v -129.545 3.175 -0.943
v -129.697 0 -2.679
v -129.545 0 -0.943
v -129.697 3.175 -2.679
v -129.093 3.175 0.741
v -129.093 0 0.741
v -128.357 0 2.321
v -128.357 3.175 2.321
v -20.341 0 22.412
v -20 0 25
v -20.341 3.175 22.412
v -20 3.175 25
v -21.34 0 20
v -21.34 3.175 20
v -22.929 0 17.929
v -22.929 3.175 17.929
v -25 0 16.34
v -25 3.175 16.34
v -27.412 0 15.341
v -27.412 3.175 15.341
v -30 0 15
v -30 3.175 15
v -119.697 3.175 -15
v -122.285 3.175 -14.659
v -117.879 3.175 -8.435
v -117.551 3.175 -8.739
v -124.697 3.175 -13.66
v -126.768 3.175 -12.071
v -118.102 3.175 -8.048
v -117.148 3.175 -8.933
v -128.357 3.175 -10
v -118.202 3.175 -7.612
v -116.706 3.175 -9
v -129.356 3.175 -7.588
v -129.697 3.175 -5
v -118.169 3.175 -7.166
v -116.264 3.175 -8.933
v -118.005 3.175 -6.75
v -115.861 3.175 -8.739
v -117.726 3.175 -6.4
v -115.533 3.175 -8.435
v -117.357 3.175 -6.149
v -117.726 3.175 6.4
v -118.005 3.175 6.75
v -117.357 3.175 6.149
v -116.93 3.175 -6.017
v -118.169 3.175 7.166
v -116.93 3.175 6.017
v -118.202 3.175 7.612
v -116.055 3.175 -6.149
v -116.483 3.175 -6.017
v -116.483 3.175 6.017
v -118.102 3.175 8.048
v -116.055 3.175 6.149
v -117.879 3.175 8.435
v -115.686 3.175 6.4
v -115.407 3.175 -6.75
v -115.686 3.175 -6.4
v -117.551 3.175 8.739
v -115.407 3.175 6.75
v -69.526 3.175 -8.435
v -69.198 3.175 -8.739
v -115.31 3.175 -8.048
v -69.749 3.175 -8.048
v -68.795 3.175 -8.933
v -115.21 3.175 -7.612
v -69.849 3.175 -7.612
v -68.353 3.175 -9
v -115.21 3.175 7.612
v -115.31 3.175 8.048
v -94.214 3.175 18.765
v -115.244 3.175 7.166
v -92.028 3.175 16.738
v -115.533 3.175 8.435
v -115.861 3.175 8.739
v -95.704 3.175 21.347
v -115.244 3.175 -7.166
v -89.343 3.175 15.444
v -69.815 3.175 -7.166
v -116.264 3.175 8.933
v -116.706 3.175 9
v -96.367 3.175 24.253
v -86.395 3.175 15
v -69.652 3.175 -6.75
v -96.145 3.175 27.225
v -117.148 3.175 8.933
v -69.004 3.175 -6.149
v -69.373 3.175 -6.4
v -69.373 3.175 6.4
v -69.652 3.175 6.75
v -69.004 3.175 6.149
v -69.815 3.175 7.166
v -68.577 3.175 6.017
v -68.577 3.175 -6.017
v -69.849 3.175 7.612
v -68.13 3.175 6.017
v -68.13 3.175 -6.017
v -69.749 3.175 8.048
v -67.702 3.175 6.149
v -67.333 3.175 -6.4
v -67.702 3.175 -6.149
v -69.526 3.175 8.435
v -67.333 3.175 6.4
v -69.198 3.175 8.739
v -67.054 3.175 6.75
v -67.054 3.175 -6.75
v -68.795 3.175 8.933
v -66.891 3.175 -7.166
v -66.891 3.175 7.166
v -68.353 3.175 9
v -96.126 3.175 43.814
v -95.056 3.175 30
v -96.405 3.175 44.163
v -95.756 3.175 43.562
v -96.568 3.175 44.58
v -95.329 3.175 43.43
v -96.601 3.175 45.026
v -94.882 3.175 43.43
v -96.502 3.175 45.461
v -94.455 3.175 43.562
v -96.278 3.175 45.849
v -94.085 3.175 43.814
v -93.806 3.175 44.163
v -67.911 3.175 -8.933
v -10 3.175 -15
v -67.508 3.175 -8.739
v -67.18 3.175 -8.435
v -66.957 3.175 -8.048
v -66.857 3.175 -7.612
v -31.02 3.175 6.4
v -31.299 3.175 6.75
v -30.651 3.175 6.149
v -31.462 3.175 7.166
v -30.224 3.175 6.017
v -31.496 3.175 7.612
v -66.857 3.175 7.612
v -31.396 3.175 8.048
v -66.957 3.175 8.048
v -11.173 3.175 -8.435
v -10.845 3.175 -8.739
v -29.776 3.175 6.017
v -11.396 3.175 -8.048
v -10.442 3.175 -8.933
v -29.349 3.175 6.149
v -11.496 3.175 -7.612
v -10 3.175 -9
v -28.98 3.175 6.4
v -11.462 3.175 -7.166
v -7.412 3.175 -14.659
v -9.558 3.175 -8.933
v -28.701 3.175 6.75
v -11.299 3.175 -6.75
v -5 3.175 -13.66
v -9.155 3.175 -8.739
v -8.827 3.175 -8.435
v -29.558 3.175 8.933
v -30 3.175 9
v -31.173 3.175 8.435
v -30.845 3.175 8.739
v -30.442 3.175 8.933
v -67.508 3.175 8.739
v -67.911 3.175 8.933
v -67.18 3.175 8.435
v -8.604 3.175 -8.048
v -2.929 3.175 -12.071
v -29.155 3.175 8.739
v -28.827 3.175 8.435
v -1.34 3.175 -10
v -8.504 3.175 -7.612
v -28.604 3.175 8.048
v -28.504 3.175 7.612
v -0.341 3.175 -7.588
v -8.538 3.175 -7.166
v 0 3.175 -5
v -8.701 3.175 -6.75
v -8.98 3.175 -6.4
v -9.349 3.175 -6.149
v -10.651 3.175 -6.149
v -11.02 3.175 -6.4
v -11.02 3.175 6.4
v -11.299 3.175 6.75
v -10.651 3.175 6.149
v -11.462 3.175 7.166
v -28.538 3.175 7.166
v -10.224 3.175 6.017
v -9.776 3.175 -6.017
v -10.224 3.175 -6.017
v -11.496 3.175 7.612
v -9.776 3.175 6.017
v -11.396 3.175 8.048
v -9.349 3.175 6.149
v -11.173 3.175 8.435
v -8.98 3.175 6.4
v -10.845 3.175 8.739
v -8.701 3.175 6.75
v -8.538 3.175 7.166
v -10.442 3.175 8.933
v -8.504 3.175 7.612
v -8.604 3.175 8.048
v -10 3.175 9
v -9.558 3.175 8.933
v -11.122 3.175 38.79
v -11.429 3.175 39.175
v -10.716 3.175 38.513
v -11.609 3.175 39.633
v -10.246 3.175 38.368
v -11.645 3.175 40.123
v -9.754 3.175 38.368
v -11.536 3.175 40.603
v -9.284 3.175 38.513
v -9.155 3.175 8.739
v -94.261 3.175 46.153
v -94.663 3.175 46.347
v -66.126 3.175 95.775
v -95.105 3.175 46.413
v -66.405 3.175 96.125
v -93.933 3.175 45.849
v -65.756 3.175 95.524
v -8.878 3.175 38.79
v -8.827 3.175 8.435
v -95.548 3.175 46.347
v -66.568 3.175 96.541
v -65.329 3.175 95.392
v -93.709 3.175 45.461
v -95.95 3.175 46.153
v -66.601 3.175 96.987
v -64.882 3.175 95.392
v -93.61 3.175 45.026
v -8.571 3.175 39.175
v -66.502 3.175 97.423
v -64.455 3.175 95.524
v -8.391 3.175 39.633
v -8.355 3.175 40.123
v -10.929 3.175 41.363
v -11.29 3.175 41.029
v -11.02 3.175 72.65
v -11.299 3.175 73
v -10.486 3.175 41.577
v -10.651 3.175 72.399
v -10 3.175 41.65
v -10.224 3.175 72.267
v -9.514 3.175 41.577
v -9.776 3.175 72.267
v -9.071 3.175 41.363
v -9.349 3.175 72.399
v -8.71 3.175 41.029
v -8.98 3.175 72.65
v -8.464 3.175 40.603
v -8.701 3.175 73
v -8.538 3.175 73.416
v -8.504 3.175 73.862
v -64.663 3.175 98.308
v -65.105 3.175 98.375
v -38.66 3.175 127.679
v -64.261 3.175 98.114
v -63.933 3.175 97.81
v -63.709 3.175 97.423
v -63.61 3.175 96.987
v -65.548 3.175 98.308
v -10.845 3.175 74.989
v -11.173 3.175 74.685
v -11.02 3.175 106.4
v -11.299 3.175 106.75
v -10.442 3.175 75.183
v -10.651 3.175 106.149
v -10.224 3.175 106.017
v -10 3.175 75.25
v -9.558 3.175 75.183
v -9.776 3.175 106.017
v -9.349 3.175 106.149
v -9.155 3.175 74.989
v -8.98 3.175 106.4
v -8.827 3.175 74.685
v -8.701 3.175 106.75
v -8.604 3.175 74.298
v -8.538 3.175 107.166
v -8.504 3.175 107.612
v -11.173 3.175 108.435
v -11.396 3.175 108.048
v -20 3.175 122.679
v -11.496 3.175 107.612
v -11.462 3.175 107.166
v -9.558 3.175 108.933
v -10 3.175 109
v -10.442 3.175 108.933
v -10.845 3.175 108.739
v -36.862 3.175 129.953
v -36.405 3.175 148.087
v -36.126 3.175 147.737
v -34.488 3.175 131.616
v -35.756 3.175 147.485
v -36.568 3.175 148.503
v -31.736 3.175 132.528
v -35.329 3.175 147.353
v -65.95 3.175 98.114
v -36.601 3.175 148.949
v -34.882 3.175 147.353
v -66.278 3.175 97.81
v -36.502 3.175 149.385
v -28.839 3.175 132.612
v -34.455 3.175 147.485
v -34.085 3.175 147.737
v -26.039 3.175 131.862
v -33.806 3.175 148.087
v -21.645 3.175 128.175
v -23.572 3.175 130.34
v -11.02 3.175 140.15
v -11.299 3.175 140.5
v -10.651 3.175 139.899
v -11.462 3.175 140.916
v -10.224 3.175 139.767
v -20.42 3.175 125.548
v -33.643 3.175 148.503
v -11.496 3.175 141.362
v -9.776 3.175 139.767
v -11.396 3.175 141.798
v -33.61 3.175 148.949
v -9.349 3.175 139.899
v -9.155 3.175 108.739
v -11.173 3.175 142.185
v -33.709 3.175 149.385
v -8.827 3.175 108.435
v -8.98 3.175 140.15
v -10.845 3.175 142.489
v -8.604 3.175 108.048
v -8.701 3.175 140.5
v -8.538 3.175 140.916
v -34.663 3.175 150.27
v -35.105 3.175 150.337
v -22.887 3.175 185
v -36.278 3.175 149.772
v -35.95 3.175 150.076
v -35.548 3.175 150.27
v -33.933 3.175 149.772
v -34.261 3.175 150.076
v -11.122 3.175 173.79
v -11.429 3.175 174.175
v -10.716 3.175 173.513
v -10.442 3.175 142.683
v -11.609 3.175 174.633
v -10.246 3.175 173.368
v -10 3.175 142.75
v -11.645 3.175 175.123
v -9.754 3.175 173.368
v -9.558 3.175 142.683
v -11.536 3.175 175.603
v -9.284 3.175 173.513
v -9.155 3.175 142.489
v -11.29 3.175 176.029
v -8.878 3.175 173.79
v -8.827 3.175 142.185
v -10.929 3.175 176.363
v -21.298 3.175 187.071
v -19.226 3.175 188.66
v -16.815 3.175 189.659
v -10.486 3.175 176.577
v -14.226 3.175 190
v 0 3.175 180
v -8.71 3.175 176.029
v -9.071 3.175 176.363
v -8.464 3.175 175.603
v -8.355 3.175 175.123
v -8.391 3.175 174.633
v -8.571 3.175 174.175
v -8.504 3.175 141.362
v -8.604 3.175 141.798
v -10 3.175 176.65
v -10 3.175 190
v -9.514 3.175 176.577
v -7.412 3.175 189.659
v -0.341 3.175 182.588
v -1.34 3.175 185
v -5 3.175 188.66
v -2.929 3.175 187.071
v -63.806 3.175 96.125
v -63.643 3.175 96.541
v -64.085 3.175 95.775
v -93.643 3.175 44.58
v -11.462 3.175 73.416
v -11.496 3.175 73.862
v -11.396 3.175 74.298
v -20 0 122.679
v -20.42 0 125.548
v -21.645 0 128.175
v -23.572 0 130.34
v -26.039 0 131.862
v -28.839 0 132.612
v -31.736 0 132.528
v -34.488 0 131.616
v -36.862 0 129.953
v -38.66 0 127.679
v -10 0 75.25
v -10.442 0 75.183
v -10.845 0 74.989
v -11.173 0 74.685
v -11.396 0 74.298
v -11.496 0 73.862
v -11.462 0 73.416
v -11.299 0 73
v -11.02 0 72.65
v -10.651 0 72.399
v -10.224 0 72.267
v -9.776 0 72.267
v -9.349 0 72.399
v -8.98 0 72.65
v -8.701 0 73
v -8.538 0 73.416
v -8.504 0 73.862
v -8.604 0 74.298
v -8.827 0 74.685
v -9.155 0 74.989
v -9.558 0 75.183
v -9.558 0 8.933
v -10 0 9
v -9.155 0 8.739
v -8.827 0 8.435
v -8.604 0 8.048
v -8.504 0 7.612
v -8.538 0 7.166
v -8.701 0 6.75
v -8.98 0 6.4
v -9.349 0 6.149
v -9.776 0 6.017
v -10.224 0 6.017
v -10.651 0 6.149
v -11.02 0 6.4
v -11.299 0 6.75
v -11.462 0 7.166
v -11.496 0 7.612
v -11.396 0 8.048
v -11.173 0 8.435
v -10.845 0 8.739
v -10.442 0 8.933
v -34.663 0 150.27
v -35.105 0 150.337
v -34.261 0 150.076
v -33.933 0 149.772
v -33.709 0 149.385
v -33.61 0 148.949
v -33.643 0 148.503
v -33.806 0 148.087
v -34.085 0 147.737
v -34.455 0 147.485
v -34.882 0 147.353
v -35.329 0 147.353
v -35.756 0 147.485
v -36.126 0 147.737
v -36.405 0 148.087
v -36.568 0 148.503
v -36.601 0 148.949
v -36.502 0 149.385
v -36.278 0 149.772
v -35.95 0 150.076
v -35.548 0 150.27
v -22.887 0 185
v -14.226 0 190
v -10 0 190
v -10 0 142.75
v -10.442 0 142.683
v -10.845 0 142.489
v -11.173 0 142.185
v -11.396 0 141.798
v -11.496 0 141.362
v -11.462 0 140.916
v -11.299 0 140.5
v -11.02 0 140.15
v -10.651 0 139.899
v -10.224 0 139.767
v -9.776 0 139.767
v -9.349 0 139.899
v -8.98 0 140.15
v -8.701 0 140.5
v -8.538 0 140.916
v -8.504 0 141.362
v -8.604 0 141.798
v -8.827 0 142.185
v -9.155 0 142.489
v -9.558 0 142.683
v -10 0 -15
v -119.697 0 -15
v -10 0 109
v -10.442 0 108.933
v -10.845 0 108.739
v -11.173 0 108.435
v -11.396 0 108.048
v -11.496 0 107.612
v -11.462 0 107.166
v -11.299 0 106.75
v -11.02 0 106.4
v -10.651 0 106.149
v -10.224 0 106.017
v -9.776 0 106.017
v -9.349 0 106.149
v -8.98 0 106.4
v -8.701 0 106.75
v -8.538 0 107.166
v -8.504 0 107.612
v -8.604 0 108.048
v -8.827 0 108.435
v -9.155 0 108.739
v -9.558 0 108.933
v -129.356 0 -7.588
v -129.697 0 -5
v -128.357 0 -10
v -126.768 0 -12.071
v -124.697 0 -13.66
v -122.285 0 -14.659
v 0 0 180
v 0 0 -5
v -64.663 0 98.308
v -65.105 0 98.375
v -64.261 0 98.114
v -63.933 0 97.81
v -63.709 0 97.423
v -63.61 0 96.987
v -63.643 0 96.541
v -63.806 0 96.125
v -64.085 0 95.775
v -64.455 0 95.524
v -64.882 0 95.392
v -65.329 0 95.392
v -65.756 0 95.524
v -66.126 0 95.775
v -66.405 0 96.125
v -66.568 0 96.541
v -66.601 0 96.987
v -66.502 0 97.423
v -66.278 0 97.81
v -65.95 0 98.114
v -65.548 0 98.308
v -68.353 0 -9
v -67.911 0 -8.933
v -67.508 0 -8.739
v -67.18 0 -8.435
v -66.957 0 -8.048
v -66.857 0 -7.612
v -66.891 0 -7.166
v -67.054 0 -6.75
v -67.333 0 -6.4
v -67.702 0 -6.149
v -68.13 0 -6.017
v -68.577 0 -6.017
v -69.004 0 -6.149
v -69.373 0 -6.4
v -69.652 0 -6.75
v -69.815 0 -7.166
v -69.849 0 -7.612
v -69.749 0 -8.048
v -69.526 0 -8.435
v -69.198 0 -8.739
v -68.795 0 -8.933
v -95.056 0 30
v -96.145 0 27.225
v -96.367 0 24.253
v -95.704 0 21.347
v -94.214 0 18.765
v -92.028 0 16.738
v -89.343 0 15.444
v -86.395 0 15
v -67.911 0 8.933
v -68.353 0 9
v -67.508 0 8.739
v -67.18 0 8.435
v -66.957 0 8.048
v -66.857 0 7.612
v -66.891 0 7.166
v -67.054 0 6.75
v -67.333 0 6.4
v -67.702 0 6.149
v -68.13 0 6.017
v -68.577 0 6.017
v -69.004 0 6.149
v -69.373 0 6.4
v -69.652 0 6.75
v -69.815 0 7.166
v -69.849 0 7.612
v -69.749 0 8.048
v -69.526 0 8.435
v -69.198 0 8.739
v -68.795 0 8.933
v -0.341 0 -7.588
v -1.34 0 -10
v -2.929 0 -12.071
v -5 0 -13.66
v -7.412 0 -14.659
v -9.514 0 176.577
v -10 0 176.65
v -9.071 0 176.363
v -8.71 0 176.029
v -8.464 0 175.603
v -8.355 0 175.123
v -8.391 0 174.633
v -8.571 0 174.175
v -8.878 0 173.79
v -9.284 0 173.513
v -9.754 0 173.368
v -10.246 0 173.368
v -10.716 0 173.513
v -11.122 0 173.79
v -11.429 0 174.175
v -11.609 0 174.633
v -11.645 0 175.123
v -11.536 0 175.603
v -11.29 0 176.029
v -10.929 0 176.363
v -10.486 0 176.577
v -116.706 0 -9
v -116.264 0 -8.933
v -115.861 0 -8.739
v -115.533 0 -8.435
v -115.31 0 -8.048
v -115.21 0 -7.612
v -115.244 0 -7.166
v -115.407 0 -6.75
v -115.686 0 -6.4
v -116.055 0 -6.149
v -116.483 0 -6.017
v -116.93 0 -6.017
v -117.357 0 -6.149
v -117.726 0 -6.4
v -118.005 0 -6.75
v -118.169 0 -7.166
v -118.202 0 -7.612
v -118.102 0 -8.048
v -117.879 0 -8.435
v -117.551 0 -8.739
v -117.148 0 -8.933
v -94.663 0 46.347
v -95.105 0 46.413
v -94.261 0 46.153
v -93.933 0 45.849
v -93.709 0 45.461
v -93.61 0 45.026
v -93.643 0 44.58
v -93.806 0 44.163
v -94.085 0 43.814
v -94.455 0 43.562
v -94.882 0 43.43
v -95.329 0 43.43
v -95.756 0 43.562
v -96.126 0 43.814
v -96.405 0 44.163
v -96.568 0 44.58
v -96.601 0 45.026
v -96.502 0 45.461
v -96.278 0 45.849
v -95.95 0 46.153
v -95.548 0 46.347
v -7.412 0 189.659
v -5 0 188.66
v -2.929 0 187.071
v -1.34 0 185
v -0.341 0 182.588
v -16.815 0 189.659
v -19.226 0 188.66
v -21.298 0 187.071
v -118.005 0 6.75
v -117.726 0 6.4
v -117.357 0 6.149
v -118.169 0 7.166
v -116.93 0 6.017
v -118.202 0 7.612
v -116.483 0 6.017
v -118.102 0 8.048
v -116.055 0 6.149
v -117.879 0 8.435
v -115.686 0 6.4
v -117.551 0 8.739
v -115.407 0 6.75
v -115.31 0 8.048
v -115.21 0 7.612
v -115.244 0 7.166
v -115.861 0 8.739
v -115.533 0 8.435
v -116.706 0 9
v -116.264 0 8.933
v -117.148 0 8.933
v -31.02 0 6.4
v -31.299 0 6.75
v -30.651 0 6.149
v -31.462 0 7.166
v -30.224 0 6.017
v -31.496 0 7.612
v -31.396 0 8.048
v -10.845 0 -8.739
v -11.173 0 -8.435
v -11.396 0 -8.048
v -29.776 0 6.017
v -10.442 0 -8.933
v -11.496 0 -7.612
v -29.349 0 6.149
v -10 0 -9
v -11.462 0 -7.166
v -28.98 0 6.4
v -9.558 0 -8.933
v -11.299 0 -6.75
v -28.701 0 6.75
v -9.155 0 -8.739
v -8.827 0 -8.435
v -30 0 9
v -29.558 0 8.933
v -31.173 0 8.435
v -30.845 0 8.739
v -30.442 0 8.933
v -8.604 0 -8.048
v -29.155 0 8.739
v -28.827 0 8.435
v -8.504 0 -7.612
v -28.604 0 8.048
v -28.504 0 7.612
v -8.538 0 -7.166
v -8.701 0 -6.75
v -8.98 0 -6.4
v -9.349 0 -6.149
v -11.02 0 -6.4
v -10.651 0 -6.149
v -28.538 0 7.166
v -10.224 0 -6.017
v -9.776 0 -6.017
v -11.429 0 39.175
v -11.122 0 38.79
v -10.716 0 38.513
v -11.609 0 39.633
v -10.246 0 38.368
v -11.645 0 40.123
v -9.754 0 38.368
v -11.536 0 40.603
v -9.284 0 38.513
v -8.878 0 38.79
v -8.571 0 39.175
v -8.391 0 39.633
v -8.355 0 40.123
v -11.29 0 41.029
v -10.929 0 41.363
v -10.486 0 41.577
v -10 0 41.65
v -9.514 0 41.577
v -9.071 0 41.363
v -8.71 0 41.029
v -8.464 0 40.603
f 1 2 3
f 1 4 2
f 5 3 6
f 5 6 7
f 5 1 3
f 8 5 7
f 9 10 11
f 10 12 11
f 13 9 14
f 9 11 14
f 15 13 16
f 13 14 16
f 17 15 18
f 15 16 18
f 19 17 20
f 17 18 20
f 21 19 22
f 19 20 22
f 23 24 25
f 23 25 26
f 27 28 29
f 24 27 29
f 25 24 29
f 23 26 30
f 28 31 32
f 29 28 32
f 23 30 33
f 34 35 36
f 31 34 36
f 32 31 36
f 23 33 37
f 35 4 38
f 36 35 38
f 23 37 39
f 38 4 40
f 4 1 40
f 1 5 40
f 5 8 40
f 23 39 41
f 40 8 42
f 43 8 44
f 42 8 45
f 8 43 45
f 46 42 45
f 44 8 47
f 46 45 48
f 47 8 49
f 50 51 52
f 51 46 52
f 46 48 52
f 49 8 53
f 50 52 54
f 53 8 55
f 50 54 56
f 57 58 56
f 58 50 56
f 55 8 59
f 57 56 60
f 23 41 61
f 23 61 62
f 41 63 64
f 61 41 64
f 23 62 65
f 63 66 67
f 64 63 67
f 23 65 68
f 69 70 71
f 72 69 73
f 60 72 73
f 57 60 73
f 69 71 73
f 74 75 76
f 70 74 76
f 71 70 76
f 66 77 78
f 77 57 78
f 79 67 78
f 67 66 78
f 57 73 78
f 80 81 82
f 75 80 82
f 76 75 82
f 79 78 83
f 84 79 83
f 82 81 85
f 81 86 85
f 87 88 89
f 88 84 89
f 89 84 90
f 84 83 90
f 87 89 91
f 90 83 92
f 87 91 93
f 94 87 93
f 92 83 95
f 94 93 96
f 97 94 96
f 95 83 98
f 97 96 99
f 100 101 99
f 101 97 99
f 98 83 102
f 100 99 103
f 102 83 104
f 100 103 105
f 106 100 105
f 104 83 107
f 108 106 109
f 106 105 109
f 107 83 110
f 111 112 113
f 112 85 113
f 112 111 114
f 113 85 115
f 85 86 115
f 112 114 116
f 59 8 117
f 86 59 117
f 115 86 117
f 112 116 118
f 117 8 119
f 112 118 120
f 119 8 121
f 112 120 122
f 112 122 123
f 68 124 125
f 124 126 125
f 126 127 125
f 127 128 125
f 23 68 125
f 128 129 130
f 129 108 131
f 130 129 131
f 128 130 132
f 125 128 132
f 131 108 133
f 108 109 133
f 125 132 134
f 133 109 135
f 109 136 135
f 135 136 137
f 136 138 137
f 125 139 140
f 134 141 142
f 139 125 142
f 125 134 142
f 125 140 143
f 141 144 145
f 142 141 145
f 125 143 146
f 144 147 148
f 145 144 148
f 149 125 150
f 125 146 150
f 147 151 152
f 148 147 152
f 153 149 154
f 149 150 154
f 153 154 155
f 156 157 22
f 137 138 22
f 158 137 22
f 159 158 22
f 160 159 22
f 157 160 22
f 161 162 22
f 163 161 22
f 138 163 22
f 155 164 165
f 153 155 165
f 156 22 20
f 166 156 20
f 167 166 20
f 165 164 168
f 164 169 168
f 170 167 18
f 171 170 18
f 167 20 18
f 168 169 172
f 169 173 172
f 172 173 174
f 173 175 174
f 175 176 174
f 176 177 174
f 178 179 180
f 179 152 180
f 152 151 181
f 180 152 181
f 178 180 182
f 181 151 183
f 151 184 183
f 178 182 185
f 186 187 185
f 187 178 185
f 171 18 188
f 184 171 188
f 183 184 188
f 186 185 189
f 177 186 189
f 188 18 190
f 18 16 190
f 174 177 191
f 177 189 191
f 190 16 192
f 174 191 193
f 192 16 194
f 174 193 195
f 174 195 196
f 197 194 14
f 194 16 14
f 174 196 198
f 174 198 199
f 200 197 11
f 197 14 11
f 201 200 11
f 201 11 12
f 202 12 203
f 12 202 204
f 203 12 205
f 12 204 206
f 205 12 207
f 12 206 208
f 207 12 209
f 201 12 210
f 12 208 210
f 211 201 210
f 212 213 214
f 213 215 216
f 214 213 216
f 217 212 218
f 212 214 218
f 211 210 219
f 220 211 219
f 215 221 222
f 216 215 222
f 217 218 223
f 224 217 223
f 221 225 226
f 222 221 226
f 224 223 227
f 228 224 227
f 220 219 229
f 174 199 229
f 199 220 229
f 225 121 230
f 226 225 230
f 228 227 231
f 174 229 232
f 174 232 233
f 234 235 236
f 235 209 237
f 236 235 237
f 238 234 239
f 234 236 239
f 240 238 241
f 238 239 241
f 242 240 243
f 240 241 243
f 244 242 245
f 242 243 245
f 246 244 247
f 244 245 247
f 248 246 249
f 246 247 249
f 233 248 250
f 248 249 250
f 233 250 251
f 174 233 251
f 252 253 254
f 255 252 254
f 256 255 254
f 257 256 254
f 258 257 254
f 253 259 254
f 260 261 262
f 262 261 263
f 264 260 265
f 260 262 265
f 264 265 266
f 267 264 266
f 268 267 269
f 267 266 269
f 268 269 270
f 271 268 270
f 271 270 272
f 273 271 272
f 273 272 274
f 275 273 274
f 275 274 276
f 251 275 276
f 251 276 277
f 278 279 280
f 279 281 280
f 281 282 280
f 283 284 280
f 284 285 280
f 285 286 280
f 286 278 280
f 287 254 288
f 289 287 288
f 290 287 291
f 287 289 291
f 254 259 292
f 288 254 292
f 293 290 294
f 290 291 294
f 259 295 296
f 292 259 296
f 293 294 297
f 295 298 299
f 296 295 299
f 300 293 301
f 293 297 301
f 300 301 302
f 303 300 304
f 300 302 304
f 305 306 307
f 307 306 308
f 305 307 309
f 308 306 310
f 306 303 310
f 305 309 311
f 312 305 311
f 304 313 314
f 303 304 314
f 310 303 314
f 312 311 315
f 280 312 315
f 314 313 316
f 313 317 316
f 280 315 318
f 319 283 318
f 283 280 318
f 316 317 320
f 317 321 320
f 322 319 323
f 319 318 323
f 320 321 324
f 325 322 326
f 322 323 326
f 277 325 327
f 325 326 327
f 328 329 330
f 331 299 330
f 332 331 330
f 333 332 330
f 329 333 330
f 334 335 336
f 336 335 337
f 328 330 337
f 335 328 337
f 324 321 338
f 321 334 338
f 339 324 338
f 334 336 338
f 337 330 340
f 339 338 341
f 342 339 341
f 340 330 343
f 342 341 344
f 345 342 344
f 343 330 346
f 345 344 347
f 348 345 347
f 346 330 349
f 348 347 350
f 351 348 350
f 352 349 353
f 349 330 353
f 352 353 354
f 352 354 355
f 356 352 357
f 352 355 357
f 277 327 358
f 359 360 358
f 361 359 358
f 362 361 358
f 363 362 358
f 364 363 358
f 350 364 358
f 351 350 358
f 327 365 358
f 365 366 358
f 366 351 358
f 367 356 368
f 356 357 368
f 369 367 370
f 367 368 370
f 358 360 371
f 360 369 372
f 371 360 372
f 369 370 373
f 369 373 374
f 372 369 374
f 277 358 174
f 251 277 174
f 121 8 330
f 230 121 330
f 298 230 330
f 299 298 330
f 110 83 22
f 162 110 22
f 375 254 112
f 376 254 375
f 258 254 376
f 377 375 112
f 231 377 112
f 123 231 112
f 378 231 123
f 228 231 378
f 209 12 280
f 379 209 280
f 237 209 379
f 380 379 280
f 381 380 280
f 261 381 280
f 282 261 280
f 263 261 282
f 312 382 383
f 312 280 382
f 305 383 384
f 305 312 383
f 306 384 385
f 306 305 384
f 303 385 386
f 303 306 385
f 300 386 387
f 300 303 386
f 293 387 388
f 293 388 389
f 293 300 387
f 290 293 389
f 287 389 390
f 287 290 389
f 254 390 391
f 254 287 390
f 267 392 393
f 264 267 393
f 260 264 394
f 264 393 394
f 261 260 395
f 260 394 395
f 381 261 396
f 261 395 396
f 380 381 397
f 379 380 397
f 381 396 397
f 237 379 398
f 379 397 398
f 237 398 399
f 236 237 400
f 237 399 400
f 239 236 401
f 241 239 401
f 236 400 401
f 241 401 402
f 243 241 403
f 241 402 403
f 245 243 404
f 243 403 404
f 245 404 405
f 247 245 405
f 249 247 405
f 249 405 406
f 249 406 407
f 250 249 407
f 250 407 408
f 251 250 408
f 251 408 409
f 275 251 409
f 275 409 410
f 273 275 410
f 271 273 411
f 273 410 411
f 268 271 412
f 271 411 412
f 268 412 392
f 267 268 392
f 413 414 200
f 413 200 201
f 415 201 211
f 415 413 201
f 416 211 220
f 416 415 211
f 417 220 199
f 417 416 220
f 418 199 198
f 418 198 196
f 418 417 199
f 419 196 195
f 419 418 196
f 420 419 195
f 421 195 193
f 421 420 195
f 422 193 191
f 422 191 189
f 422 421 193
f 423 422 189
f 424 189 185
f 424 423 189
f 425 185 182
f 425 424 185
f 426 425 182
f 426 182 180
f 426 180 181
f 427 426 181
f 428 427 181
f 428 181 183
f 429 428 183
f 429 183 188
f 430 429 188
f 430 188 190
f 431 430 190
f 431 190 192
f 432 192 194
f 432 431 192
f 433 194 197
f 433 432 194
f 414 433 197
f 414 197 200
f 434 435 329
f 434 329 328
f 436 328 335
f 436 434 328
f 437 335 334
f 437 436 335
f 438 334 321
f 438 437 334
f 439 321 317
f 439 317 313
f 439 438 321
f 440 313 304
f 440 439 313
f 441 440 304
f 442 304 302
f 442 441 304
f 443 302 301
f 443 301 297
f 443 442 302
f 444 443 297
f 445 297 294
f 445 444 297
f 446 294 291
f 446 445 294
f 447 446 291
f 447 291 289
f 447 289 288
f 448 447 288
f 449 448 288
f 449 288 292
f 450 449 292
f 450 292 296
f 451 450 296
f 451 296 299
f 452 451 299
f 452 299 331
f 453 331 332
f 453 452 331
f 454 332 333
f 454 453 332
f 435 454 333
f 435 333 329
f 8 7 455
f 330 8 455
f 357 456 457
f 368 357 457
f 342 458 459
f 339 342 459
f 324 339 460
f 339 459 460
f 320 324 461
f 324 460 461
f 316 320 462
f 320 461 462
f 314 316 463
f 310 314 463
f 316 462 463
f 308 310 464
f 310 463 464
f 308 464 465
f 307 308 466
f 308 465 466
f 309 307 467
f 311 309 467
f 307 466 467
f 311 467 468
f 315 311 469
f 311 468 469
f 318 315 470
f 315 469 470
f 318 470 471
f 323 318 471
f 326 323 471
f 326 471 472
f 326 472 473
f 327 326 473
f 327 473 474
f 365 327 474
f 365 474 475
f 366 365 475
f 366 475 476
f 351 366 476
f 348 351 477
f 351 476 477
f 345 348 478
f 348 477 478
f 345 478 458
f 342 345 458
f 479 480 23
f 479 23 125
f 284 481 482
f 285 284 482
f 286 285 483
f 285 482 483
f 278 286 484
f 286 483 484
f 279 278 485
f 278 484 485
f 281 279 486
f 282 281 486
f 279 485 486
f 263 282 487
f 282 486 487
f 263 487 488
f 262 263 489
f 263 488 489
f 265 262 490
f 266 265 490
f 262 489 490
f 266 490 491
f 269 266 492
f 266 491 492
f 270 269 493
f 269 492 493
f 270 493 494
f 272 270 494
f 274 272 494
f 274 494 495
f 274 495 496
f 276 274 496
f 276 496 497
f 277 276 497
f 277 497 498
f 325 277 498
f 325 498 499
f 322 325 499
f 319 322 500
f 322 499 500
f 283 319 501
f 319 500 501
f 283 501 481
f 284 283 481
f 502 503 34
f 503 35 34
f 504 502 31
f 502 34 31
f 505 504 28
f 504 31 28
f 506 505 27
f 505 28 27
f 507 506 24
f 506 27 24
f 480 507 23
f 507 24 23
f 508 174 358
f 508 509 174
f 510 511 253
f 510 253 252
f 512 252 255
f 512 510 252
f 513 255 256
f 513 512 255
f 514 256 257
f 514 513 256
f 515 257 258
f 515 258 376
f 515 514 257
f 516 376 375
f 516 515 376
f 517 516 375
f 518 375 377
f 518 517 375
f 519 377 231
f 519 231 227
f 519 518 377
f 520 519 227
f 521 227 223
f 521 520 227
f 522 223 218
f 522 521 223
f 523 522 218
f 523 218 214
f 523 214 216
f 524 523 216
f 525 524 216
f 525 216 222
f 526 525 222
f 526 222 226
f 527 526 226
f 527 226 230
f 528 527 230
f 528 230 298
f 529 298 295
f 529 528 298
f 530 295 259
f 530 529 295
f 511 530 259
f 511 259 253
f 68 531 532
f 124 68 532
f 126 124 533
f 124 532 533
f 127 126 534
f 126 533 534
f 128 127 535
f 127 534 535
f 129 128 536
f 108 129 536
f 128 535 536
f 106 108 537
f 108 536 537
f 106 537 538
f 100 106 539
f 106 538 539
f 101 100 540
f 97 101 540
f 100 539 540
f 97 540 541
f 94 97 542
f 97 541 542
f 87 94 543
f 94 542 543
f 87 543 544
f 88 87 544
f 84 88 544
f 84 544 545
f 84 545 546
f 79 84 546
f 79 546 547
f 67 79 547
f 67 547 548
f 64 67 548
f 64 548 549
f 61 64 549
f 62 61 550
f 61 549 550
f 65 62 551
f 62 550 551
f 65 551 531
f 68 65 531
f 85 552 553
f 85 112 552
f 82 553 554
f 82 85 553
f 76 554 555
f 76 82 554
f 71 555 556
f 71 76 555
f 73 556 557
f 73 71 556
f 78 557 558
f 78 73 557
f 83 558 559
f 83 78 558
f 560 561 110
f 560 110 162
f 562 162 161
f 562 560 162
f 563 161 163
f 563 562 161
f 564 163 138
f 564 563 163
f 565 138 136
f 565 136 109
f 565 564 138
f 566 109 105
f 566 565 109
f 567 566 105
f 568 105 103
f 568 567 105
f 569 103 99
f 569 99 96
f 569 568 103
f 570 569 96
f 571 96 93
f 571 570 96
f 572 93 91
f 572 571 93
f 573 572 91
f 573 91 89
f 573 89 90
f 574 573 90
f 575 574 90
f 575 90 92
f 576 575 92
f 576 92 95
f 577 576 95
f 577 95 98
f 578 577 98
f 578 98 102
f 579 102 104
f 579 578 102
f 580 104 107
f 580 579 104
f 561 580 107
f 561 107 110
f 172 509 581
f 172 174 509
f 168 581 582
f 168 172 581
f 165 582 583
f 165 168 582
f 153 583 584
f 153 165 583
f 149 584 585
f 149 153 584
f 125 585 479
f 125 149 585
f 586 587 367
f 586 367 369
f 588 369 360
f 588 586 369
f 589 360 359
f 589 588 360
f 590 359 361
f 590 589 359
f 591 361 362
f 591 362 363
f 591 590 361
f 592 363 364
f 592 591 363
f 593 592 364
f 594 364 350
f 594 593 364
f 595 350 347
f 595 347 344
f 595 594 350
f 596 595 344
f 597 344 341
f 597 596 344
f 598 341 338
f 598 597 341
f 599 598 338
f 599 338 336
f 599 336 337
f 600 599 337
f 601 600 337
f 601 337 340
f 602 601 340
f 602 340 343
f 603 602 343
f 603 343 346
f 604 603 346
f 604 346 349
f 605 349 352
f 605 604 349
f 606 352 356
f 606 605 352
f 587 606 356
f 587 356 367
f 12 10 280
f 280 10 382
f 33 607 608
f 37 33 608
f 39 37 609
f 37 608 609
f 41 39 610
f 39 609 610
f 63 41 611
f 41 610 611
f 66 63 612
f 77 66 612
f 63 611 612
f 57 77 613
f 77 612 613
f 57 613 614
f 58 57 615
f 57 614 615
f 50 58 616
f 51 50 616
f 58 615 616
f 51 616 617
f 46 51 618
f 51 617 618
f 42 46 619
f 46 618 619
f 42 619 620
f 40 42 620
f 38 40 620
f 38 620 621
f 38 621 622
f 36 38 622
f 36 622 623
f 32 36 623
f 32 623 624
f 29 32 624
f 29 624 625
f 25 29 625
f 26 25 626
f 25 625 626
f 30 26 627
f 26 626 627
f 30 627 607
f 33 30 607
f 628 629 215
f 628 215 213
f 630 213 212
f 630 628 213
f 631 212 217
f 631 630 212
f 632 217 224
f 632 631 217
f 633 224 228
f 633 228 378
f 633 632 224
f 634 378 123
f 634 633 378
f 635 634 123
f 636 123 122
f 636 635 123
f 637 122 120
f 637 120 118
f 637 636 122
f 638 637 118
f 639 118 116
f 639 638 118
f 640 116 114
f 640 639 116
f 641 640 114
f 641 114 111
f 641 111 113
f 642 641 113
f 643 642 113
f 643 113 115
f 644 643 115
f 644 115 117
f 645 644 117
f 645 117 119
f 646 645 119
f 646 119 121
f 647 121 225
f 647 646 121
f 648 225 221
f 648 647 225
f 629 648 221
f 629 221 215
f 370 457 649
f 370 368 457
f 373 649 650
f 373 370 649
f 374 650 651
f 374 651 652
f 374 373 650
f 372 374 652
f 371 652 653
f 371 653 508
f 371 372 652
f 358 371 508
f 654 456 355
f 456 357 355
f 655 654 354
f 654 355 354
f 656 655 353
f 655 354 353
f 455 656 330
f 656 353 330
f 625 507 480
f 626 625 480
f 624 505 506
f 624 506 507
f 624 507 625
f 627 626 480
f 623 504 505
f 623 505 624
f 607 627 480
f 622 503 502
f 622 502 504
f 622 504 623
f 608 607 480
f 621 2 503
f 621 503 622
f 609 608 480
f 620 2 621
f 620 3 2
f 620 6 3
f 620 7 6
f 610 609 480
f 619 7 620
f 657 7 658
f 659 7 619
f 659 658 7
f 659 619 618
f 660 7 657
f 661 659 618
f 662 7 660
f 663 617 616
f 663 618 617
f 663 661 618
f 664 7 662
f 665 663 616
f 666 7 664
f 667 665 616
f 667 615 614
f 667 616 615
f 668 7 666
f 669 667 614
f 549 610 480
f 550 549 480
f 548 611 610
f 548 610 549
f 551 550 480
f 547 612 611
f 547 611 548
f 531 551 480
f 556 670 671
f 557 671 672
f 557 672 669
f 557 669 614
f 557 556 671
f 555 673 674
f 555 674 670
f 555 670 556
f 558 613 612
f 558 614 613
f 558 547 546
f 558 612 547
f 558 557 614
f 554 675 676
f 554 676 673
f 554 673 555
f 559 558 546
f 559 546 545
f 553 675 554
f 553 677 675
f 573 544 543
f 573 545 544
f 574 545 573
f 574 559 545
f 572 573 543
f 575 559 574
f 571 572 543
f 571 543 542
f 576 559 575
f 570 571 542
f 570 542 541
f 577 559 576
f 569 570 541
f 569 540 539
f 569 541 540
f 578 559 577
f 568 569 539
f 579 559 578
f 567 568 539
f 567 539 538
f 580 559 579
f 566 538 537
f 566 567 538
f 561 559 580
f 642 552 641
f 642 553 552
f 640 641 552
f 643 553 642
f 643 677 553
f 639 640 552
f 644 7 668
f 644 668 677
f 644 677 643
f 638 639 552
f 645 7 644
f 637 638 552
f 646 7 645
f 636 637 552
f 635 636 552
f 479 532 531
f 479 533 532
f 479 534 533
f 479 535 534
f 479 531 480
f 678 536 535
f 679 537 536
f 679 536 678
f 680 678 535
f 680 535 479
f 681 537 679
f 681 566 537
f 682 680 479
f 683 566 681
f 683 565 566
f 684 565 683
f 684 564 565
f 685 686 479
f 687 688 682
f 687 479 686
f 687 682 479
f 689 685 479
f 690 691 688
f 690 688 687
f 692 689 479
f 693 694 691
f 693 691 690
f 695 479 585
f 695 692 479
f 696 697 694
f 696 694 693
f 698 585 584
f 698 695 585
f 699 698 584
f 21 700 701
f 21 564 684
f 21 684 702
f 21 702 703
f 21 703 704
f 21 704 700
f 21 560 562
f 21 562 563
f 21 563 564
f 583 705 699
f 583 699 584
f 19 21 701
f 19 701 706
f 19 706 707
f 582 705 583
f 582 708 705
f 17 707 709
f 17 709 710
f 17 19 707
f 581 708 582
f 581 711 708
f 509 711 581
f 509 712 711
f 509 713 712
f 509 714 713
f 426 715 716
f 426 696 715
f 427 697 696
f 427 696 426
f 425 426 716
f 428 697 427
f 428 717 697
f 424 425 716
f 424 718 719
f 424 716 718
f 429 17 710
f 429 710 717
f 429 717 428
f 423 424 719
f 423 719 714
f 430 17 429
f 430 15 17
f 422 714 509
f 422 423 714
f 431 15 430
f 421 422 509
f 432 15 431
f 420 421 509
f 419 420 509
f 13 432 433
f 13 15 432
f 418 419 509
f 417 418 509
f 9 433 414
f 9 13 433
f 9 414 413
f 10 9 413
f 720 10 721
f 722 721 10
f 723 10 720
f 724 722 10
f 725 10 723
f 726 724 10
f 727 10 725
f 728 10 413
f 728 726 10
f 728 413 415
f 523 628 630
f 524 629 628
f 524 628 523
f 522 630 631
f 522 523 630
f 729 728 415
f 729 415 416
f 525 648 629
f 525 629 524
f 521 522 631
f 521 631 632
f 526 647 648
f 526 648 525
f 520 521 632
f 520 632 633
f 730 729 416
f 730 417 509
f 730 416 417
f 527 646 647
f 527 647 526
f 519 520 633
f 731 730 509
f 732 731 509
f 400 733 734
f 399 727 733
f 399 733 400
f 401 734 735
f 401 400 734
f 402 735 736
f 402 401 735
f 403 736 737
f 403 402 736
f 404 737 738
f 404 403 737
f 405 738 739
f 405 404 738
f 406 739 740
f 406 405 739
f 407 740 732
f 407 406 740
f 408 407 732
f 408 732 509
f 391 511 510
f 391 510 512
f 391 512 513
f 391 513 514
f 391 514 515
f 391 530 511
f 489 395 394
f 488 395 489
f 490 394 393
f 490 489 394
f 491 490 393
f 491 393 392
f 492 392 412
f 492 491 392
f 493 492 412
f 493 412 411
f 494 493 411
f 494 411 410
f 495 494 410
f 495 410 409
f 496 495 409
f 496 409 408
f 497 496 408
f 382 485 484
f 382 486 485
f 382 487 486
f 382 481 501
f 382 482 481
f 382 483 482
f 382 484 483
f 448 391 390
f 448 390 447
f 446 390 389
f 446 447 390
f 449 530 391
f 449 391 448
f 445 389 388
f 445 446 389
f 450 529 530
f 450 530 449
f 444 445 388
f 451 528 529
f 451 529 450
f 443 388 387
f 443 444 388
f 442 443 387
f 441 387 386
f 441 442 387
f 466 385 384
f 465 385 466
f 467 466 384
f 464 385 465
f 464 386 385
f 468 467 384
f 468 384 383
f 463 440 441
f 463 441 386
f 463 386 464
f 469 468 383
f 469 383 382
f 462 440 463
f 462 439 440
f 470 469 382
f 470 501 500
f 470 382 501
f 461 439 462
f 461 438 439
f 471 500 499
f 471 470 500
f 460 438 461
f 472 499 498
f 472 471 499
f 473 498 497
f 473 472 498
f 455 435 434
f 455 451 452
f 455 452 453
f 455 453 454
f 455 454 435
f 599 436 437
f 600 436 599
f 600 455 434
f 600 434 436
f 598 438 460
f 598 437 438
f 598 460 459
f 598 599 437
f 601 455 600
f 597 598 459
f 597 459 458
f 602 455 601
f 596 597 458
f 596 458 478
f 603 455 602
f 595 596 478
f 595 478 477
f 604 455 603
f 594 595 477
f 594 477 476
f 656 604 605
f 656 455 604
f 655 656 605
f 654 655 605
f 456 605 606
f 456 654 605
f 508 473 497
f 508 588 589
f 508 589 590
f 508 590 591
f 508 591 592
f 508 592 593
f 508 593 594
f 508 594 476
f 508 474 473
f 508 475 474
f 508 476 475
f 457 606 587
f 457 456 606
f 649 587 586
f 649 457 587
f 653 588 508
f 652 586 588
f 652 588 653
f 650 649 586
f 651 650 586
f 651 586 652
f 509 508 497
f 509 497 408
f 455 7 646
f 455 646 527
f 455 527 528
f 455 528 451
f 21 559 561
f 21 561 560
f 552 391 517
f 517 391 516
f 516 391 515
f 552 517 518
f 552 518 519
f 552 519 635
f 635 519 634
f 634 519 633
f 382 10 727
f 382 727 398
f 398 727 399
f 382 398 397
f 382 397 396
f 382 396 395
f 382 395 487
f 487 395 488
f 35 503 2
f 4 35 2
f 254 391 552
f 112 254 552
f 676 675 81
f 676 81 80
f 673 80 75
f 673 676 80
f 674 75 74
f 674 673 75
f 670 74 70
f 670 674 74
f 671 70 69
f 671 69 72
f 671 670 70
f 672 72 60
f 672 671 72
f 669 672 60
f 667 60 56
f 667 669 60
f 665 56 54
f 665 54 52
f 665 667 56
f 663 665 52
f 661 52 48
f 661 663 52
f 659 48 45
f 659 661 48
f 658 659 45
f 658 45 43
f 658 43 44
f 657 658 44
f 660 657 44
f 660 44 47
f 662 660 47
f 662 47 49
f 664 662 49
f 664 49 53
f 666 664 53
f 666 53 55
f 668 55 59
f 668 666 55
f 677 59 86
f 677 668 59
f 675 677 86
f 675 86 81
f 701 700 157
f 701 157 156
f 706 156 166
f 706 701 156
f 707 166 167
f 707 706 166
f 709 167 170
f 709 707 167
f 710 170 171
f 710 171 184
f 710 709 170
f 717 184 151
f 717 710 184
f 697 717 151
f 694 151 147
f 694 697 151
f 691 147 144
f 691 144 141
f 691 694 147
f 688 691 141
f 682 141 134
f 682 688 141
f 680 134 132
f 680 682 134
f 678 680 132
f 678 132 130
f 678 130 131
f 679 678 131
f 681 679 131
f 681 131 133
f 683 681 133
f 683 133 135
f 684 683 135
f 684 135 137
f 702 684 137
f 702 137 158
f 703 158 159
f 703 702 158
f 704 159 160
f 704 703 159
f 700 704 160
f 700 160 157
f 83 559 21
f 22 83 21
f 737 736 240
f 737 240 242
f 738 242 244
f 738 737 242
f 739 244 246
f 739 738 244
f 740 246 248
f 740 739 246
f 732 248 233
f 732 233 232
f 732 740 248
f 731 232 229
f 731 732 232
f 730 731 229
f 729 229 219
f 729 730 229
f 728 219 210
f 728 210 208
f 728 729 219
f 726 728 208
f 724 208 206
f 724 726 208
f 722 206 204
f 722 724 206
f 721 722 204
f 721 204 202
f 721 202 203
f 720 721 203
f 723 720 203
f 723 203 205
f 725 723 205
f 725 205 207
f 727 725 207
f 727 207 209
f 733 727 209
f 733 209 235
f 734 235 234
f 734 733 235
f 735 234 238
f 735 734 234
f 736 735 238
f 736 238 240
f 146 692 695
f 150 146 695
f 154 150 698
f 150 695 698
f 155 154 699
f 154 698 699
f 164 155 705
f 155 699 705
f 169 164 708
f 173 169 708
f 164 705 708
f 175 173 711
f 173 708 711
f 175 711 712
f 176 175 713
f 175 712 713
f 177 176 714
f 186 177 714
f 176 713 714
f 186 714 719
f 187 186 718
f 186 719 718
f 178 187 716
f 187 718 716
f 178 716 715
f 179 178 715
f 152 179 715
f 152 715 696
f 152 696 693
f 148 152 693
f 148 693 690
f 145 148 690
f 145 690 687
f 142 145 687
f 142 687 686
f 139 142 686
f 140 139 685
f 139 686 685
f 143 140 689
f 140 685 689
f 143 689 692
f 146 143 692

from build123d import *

# Parameters (mm, degrees)
SKETCH1_R           = 1.5
SKETCH1_R_2         = 1.65
BOSS_EXTRUDE1_DEPTH = 3.175
SKETCH2_W           = 129.696551146
SKETCH2_H           = 15
SKETCH2_R           = 1.5
BOSS_EXTRUDE2_DEPTH = 3.175
FILLET1_R           = 10


with BuildPart() as part:
    # Sketch1 → Boss-Extrude1 (new body)
    with BuildSketch(Plane(origin=(0, 0, 0), x_dir=(1, 0, 0), z_dir=(0, 1, 0))):
        Polygon((-20, -190), (0, -190), (0, 0), (-129.696551146, 0), align=None)
        with Locations(Location((-65.10548978, -96.875, 0), (0, 0, 270))):
            Circle(SKETCH1_R, mode=Mode.SUBTRACT)
        with Locations(Location((-10, -175, 0), (0, 0, 270))):
            Circle(SKETCH1_R_2, mode=Mode.SUBTRACT)
        with Locations(Location((-35.10548978, -148.836524227, 0), (0, 0, 270))):
            Circle(SKETCH1_R, mode=Mode.SUBTRACT)
        with BuildLine():
            ThreePointArc((-10, -139.75), (-8.5, -141.25), (-10, -142.75))
            ThreePointArc((-10, -142.75), (-11.5, -141.25), (-10, -139.75))
        make_face(mode=Mode.SUBTRACT)
        with BuildLine():
            ThreePointArc((-10, -106), (-8.5, -107.5), (-10, -109))
            ThreePointArc((-10, -109), (-11.5, -107.5), (-10, -106))
        make_face(mode=Mode.SUBTRACT)
        with Locations(Location((-95.10548978, -44.913475773, 0), (0, 0, 270))):
            Circle(SKETCH1_R, mode=Mode.SUBTRACT)
        with Locations(Location((-116.706170089, -7.5, 0), (0, 0, 270))):
            Circle(SKETCH1_R, mode=Mode.SUBTRACT)
        with Locations(Location((-68.353085045, -7.5, 0), (0, 0, 270))):
            Circle(SKETCH1_R, mode=Mode.SUBTRACT)
        Polygon((-20, -15), (-20, -160), (-103.715789032, -15), align=None, mode=Mode.SUBTRACT)
        with BuildLine():
            ThreePointArc((-10, -72.25), (-8.5, -73.75), (-10, -75.25))
            ThreePointArc((-10, -75.25), (-11.5, -73.75), (-10, -72.25))
        make_face(mode=Mode.SUBTRACT)
        with Locations(Location((-10, -40, 0), (0, 0, 270))):
            Circle(SKETCH1_R_2, mode=Mode.SUBTRACT)
        with Locations(Location((-30, -7.5, 0), (0, 0, 270))):
            Circle(SKETCH1_R, mode=Mode.SUBTRACT)
        with Locations(Location((-10, -7.5, 0), (0, 0, 270))):
            Circle(SKETCH1_R, mode=Mode.SUBTRACT)
    extrude(amount=BOSS_EXTRUDE1_DEPTH)

    # Sketch2 → Boss-Extrude2 (add)
    with BuildSketch(Plane.XZ):
        with Locations((-64.848275573, -7.5)):
            Rectangle(SKETCH2_W, SKETCH2_H)
        with Locations(Location((-116.706170089, -7.5, 0), (0, 0, 270))):
            Circle(SKETCH2_R, mode=Mode.SUBTRACT)
        with Locations(Location((-68.353085045, -7.5, 0), (0, 0, 270))):
            Circle(SKETCH2_R, mode=Mode.SUBTRACT)
        with Locations(Location((-10, -7.5, 0), (0, 0, 270))):
            Circle(SKETCH2_R, mode=Mode.SUBTRACT)
    extrude(amount=-BOSS_EXTRUDE2_DEPTH)

    # Fillet1
    fillet1_edges = [part.edges().sort_by_distance(p)[0] for p in [
        (0, 1.5875, 190),
        (-20, 1.5875, 190),
        (-129.696551146, 1.5875, 0),
        (-103.715789032, 1.5875, 15),
        (-20, 1.5875, 160),
        (-20, 1.5875, 15),
        (0, 1.5875, -15),
        (-129.696551146, 1.5875, -15),
    ]]
    fillet(fillet1_edges, radius=FILLET1_R)


solid = part.part
